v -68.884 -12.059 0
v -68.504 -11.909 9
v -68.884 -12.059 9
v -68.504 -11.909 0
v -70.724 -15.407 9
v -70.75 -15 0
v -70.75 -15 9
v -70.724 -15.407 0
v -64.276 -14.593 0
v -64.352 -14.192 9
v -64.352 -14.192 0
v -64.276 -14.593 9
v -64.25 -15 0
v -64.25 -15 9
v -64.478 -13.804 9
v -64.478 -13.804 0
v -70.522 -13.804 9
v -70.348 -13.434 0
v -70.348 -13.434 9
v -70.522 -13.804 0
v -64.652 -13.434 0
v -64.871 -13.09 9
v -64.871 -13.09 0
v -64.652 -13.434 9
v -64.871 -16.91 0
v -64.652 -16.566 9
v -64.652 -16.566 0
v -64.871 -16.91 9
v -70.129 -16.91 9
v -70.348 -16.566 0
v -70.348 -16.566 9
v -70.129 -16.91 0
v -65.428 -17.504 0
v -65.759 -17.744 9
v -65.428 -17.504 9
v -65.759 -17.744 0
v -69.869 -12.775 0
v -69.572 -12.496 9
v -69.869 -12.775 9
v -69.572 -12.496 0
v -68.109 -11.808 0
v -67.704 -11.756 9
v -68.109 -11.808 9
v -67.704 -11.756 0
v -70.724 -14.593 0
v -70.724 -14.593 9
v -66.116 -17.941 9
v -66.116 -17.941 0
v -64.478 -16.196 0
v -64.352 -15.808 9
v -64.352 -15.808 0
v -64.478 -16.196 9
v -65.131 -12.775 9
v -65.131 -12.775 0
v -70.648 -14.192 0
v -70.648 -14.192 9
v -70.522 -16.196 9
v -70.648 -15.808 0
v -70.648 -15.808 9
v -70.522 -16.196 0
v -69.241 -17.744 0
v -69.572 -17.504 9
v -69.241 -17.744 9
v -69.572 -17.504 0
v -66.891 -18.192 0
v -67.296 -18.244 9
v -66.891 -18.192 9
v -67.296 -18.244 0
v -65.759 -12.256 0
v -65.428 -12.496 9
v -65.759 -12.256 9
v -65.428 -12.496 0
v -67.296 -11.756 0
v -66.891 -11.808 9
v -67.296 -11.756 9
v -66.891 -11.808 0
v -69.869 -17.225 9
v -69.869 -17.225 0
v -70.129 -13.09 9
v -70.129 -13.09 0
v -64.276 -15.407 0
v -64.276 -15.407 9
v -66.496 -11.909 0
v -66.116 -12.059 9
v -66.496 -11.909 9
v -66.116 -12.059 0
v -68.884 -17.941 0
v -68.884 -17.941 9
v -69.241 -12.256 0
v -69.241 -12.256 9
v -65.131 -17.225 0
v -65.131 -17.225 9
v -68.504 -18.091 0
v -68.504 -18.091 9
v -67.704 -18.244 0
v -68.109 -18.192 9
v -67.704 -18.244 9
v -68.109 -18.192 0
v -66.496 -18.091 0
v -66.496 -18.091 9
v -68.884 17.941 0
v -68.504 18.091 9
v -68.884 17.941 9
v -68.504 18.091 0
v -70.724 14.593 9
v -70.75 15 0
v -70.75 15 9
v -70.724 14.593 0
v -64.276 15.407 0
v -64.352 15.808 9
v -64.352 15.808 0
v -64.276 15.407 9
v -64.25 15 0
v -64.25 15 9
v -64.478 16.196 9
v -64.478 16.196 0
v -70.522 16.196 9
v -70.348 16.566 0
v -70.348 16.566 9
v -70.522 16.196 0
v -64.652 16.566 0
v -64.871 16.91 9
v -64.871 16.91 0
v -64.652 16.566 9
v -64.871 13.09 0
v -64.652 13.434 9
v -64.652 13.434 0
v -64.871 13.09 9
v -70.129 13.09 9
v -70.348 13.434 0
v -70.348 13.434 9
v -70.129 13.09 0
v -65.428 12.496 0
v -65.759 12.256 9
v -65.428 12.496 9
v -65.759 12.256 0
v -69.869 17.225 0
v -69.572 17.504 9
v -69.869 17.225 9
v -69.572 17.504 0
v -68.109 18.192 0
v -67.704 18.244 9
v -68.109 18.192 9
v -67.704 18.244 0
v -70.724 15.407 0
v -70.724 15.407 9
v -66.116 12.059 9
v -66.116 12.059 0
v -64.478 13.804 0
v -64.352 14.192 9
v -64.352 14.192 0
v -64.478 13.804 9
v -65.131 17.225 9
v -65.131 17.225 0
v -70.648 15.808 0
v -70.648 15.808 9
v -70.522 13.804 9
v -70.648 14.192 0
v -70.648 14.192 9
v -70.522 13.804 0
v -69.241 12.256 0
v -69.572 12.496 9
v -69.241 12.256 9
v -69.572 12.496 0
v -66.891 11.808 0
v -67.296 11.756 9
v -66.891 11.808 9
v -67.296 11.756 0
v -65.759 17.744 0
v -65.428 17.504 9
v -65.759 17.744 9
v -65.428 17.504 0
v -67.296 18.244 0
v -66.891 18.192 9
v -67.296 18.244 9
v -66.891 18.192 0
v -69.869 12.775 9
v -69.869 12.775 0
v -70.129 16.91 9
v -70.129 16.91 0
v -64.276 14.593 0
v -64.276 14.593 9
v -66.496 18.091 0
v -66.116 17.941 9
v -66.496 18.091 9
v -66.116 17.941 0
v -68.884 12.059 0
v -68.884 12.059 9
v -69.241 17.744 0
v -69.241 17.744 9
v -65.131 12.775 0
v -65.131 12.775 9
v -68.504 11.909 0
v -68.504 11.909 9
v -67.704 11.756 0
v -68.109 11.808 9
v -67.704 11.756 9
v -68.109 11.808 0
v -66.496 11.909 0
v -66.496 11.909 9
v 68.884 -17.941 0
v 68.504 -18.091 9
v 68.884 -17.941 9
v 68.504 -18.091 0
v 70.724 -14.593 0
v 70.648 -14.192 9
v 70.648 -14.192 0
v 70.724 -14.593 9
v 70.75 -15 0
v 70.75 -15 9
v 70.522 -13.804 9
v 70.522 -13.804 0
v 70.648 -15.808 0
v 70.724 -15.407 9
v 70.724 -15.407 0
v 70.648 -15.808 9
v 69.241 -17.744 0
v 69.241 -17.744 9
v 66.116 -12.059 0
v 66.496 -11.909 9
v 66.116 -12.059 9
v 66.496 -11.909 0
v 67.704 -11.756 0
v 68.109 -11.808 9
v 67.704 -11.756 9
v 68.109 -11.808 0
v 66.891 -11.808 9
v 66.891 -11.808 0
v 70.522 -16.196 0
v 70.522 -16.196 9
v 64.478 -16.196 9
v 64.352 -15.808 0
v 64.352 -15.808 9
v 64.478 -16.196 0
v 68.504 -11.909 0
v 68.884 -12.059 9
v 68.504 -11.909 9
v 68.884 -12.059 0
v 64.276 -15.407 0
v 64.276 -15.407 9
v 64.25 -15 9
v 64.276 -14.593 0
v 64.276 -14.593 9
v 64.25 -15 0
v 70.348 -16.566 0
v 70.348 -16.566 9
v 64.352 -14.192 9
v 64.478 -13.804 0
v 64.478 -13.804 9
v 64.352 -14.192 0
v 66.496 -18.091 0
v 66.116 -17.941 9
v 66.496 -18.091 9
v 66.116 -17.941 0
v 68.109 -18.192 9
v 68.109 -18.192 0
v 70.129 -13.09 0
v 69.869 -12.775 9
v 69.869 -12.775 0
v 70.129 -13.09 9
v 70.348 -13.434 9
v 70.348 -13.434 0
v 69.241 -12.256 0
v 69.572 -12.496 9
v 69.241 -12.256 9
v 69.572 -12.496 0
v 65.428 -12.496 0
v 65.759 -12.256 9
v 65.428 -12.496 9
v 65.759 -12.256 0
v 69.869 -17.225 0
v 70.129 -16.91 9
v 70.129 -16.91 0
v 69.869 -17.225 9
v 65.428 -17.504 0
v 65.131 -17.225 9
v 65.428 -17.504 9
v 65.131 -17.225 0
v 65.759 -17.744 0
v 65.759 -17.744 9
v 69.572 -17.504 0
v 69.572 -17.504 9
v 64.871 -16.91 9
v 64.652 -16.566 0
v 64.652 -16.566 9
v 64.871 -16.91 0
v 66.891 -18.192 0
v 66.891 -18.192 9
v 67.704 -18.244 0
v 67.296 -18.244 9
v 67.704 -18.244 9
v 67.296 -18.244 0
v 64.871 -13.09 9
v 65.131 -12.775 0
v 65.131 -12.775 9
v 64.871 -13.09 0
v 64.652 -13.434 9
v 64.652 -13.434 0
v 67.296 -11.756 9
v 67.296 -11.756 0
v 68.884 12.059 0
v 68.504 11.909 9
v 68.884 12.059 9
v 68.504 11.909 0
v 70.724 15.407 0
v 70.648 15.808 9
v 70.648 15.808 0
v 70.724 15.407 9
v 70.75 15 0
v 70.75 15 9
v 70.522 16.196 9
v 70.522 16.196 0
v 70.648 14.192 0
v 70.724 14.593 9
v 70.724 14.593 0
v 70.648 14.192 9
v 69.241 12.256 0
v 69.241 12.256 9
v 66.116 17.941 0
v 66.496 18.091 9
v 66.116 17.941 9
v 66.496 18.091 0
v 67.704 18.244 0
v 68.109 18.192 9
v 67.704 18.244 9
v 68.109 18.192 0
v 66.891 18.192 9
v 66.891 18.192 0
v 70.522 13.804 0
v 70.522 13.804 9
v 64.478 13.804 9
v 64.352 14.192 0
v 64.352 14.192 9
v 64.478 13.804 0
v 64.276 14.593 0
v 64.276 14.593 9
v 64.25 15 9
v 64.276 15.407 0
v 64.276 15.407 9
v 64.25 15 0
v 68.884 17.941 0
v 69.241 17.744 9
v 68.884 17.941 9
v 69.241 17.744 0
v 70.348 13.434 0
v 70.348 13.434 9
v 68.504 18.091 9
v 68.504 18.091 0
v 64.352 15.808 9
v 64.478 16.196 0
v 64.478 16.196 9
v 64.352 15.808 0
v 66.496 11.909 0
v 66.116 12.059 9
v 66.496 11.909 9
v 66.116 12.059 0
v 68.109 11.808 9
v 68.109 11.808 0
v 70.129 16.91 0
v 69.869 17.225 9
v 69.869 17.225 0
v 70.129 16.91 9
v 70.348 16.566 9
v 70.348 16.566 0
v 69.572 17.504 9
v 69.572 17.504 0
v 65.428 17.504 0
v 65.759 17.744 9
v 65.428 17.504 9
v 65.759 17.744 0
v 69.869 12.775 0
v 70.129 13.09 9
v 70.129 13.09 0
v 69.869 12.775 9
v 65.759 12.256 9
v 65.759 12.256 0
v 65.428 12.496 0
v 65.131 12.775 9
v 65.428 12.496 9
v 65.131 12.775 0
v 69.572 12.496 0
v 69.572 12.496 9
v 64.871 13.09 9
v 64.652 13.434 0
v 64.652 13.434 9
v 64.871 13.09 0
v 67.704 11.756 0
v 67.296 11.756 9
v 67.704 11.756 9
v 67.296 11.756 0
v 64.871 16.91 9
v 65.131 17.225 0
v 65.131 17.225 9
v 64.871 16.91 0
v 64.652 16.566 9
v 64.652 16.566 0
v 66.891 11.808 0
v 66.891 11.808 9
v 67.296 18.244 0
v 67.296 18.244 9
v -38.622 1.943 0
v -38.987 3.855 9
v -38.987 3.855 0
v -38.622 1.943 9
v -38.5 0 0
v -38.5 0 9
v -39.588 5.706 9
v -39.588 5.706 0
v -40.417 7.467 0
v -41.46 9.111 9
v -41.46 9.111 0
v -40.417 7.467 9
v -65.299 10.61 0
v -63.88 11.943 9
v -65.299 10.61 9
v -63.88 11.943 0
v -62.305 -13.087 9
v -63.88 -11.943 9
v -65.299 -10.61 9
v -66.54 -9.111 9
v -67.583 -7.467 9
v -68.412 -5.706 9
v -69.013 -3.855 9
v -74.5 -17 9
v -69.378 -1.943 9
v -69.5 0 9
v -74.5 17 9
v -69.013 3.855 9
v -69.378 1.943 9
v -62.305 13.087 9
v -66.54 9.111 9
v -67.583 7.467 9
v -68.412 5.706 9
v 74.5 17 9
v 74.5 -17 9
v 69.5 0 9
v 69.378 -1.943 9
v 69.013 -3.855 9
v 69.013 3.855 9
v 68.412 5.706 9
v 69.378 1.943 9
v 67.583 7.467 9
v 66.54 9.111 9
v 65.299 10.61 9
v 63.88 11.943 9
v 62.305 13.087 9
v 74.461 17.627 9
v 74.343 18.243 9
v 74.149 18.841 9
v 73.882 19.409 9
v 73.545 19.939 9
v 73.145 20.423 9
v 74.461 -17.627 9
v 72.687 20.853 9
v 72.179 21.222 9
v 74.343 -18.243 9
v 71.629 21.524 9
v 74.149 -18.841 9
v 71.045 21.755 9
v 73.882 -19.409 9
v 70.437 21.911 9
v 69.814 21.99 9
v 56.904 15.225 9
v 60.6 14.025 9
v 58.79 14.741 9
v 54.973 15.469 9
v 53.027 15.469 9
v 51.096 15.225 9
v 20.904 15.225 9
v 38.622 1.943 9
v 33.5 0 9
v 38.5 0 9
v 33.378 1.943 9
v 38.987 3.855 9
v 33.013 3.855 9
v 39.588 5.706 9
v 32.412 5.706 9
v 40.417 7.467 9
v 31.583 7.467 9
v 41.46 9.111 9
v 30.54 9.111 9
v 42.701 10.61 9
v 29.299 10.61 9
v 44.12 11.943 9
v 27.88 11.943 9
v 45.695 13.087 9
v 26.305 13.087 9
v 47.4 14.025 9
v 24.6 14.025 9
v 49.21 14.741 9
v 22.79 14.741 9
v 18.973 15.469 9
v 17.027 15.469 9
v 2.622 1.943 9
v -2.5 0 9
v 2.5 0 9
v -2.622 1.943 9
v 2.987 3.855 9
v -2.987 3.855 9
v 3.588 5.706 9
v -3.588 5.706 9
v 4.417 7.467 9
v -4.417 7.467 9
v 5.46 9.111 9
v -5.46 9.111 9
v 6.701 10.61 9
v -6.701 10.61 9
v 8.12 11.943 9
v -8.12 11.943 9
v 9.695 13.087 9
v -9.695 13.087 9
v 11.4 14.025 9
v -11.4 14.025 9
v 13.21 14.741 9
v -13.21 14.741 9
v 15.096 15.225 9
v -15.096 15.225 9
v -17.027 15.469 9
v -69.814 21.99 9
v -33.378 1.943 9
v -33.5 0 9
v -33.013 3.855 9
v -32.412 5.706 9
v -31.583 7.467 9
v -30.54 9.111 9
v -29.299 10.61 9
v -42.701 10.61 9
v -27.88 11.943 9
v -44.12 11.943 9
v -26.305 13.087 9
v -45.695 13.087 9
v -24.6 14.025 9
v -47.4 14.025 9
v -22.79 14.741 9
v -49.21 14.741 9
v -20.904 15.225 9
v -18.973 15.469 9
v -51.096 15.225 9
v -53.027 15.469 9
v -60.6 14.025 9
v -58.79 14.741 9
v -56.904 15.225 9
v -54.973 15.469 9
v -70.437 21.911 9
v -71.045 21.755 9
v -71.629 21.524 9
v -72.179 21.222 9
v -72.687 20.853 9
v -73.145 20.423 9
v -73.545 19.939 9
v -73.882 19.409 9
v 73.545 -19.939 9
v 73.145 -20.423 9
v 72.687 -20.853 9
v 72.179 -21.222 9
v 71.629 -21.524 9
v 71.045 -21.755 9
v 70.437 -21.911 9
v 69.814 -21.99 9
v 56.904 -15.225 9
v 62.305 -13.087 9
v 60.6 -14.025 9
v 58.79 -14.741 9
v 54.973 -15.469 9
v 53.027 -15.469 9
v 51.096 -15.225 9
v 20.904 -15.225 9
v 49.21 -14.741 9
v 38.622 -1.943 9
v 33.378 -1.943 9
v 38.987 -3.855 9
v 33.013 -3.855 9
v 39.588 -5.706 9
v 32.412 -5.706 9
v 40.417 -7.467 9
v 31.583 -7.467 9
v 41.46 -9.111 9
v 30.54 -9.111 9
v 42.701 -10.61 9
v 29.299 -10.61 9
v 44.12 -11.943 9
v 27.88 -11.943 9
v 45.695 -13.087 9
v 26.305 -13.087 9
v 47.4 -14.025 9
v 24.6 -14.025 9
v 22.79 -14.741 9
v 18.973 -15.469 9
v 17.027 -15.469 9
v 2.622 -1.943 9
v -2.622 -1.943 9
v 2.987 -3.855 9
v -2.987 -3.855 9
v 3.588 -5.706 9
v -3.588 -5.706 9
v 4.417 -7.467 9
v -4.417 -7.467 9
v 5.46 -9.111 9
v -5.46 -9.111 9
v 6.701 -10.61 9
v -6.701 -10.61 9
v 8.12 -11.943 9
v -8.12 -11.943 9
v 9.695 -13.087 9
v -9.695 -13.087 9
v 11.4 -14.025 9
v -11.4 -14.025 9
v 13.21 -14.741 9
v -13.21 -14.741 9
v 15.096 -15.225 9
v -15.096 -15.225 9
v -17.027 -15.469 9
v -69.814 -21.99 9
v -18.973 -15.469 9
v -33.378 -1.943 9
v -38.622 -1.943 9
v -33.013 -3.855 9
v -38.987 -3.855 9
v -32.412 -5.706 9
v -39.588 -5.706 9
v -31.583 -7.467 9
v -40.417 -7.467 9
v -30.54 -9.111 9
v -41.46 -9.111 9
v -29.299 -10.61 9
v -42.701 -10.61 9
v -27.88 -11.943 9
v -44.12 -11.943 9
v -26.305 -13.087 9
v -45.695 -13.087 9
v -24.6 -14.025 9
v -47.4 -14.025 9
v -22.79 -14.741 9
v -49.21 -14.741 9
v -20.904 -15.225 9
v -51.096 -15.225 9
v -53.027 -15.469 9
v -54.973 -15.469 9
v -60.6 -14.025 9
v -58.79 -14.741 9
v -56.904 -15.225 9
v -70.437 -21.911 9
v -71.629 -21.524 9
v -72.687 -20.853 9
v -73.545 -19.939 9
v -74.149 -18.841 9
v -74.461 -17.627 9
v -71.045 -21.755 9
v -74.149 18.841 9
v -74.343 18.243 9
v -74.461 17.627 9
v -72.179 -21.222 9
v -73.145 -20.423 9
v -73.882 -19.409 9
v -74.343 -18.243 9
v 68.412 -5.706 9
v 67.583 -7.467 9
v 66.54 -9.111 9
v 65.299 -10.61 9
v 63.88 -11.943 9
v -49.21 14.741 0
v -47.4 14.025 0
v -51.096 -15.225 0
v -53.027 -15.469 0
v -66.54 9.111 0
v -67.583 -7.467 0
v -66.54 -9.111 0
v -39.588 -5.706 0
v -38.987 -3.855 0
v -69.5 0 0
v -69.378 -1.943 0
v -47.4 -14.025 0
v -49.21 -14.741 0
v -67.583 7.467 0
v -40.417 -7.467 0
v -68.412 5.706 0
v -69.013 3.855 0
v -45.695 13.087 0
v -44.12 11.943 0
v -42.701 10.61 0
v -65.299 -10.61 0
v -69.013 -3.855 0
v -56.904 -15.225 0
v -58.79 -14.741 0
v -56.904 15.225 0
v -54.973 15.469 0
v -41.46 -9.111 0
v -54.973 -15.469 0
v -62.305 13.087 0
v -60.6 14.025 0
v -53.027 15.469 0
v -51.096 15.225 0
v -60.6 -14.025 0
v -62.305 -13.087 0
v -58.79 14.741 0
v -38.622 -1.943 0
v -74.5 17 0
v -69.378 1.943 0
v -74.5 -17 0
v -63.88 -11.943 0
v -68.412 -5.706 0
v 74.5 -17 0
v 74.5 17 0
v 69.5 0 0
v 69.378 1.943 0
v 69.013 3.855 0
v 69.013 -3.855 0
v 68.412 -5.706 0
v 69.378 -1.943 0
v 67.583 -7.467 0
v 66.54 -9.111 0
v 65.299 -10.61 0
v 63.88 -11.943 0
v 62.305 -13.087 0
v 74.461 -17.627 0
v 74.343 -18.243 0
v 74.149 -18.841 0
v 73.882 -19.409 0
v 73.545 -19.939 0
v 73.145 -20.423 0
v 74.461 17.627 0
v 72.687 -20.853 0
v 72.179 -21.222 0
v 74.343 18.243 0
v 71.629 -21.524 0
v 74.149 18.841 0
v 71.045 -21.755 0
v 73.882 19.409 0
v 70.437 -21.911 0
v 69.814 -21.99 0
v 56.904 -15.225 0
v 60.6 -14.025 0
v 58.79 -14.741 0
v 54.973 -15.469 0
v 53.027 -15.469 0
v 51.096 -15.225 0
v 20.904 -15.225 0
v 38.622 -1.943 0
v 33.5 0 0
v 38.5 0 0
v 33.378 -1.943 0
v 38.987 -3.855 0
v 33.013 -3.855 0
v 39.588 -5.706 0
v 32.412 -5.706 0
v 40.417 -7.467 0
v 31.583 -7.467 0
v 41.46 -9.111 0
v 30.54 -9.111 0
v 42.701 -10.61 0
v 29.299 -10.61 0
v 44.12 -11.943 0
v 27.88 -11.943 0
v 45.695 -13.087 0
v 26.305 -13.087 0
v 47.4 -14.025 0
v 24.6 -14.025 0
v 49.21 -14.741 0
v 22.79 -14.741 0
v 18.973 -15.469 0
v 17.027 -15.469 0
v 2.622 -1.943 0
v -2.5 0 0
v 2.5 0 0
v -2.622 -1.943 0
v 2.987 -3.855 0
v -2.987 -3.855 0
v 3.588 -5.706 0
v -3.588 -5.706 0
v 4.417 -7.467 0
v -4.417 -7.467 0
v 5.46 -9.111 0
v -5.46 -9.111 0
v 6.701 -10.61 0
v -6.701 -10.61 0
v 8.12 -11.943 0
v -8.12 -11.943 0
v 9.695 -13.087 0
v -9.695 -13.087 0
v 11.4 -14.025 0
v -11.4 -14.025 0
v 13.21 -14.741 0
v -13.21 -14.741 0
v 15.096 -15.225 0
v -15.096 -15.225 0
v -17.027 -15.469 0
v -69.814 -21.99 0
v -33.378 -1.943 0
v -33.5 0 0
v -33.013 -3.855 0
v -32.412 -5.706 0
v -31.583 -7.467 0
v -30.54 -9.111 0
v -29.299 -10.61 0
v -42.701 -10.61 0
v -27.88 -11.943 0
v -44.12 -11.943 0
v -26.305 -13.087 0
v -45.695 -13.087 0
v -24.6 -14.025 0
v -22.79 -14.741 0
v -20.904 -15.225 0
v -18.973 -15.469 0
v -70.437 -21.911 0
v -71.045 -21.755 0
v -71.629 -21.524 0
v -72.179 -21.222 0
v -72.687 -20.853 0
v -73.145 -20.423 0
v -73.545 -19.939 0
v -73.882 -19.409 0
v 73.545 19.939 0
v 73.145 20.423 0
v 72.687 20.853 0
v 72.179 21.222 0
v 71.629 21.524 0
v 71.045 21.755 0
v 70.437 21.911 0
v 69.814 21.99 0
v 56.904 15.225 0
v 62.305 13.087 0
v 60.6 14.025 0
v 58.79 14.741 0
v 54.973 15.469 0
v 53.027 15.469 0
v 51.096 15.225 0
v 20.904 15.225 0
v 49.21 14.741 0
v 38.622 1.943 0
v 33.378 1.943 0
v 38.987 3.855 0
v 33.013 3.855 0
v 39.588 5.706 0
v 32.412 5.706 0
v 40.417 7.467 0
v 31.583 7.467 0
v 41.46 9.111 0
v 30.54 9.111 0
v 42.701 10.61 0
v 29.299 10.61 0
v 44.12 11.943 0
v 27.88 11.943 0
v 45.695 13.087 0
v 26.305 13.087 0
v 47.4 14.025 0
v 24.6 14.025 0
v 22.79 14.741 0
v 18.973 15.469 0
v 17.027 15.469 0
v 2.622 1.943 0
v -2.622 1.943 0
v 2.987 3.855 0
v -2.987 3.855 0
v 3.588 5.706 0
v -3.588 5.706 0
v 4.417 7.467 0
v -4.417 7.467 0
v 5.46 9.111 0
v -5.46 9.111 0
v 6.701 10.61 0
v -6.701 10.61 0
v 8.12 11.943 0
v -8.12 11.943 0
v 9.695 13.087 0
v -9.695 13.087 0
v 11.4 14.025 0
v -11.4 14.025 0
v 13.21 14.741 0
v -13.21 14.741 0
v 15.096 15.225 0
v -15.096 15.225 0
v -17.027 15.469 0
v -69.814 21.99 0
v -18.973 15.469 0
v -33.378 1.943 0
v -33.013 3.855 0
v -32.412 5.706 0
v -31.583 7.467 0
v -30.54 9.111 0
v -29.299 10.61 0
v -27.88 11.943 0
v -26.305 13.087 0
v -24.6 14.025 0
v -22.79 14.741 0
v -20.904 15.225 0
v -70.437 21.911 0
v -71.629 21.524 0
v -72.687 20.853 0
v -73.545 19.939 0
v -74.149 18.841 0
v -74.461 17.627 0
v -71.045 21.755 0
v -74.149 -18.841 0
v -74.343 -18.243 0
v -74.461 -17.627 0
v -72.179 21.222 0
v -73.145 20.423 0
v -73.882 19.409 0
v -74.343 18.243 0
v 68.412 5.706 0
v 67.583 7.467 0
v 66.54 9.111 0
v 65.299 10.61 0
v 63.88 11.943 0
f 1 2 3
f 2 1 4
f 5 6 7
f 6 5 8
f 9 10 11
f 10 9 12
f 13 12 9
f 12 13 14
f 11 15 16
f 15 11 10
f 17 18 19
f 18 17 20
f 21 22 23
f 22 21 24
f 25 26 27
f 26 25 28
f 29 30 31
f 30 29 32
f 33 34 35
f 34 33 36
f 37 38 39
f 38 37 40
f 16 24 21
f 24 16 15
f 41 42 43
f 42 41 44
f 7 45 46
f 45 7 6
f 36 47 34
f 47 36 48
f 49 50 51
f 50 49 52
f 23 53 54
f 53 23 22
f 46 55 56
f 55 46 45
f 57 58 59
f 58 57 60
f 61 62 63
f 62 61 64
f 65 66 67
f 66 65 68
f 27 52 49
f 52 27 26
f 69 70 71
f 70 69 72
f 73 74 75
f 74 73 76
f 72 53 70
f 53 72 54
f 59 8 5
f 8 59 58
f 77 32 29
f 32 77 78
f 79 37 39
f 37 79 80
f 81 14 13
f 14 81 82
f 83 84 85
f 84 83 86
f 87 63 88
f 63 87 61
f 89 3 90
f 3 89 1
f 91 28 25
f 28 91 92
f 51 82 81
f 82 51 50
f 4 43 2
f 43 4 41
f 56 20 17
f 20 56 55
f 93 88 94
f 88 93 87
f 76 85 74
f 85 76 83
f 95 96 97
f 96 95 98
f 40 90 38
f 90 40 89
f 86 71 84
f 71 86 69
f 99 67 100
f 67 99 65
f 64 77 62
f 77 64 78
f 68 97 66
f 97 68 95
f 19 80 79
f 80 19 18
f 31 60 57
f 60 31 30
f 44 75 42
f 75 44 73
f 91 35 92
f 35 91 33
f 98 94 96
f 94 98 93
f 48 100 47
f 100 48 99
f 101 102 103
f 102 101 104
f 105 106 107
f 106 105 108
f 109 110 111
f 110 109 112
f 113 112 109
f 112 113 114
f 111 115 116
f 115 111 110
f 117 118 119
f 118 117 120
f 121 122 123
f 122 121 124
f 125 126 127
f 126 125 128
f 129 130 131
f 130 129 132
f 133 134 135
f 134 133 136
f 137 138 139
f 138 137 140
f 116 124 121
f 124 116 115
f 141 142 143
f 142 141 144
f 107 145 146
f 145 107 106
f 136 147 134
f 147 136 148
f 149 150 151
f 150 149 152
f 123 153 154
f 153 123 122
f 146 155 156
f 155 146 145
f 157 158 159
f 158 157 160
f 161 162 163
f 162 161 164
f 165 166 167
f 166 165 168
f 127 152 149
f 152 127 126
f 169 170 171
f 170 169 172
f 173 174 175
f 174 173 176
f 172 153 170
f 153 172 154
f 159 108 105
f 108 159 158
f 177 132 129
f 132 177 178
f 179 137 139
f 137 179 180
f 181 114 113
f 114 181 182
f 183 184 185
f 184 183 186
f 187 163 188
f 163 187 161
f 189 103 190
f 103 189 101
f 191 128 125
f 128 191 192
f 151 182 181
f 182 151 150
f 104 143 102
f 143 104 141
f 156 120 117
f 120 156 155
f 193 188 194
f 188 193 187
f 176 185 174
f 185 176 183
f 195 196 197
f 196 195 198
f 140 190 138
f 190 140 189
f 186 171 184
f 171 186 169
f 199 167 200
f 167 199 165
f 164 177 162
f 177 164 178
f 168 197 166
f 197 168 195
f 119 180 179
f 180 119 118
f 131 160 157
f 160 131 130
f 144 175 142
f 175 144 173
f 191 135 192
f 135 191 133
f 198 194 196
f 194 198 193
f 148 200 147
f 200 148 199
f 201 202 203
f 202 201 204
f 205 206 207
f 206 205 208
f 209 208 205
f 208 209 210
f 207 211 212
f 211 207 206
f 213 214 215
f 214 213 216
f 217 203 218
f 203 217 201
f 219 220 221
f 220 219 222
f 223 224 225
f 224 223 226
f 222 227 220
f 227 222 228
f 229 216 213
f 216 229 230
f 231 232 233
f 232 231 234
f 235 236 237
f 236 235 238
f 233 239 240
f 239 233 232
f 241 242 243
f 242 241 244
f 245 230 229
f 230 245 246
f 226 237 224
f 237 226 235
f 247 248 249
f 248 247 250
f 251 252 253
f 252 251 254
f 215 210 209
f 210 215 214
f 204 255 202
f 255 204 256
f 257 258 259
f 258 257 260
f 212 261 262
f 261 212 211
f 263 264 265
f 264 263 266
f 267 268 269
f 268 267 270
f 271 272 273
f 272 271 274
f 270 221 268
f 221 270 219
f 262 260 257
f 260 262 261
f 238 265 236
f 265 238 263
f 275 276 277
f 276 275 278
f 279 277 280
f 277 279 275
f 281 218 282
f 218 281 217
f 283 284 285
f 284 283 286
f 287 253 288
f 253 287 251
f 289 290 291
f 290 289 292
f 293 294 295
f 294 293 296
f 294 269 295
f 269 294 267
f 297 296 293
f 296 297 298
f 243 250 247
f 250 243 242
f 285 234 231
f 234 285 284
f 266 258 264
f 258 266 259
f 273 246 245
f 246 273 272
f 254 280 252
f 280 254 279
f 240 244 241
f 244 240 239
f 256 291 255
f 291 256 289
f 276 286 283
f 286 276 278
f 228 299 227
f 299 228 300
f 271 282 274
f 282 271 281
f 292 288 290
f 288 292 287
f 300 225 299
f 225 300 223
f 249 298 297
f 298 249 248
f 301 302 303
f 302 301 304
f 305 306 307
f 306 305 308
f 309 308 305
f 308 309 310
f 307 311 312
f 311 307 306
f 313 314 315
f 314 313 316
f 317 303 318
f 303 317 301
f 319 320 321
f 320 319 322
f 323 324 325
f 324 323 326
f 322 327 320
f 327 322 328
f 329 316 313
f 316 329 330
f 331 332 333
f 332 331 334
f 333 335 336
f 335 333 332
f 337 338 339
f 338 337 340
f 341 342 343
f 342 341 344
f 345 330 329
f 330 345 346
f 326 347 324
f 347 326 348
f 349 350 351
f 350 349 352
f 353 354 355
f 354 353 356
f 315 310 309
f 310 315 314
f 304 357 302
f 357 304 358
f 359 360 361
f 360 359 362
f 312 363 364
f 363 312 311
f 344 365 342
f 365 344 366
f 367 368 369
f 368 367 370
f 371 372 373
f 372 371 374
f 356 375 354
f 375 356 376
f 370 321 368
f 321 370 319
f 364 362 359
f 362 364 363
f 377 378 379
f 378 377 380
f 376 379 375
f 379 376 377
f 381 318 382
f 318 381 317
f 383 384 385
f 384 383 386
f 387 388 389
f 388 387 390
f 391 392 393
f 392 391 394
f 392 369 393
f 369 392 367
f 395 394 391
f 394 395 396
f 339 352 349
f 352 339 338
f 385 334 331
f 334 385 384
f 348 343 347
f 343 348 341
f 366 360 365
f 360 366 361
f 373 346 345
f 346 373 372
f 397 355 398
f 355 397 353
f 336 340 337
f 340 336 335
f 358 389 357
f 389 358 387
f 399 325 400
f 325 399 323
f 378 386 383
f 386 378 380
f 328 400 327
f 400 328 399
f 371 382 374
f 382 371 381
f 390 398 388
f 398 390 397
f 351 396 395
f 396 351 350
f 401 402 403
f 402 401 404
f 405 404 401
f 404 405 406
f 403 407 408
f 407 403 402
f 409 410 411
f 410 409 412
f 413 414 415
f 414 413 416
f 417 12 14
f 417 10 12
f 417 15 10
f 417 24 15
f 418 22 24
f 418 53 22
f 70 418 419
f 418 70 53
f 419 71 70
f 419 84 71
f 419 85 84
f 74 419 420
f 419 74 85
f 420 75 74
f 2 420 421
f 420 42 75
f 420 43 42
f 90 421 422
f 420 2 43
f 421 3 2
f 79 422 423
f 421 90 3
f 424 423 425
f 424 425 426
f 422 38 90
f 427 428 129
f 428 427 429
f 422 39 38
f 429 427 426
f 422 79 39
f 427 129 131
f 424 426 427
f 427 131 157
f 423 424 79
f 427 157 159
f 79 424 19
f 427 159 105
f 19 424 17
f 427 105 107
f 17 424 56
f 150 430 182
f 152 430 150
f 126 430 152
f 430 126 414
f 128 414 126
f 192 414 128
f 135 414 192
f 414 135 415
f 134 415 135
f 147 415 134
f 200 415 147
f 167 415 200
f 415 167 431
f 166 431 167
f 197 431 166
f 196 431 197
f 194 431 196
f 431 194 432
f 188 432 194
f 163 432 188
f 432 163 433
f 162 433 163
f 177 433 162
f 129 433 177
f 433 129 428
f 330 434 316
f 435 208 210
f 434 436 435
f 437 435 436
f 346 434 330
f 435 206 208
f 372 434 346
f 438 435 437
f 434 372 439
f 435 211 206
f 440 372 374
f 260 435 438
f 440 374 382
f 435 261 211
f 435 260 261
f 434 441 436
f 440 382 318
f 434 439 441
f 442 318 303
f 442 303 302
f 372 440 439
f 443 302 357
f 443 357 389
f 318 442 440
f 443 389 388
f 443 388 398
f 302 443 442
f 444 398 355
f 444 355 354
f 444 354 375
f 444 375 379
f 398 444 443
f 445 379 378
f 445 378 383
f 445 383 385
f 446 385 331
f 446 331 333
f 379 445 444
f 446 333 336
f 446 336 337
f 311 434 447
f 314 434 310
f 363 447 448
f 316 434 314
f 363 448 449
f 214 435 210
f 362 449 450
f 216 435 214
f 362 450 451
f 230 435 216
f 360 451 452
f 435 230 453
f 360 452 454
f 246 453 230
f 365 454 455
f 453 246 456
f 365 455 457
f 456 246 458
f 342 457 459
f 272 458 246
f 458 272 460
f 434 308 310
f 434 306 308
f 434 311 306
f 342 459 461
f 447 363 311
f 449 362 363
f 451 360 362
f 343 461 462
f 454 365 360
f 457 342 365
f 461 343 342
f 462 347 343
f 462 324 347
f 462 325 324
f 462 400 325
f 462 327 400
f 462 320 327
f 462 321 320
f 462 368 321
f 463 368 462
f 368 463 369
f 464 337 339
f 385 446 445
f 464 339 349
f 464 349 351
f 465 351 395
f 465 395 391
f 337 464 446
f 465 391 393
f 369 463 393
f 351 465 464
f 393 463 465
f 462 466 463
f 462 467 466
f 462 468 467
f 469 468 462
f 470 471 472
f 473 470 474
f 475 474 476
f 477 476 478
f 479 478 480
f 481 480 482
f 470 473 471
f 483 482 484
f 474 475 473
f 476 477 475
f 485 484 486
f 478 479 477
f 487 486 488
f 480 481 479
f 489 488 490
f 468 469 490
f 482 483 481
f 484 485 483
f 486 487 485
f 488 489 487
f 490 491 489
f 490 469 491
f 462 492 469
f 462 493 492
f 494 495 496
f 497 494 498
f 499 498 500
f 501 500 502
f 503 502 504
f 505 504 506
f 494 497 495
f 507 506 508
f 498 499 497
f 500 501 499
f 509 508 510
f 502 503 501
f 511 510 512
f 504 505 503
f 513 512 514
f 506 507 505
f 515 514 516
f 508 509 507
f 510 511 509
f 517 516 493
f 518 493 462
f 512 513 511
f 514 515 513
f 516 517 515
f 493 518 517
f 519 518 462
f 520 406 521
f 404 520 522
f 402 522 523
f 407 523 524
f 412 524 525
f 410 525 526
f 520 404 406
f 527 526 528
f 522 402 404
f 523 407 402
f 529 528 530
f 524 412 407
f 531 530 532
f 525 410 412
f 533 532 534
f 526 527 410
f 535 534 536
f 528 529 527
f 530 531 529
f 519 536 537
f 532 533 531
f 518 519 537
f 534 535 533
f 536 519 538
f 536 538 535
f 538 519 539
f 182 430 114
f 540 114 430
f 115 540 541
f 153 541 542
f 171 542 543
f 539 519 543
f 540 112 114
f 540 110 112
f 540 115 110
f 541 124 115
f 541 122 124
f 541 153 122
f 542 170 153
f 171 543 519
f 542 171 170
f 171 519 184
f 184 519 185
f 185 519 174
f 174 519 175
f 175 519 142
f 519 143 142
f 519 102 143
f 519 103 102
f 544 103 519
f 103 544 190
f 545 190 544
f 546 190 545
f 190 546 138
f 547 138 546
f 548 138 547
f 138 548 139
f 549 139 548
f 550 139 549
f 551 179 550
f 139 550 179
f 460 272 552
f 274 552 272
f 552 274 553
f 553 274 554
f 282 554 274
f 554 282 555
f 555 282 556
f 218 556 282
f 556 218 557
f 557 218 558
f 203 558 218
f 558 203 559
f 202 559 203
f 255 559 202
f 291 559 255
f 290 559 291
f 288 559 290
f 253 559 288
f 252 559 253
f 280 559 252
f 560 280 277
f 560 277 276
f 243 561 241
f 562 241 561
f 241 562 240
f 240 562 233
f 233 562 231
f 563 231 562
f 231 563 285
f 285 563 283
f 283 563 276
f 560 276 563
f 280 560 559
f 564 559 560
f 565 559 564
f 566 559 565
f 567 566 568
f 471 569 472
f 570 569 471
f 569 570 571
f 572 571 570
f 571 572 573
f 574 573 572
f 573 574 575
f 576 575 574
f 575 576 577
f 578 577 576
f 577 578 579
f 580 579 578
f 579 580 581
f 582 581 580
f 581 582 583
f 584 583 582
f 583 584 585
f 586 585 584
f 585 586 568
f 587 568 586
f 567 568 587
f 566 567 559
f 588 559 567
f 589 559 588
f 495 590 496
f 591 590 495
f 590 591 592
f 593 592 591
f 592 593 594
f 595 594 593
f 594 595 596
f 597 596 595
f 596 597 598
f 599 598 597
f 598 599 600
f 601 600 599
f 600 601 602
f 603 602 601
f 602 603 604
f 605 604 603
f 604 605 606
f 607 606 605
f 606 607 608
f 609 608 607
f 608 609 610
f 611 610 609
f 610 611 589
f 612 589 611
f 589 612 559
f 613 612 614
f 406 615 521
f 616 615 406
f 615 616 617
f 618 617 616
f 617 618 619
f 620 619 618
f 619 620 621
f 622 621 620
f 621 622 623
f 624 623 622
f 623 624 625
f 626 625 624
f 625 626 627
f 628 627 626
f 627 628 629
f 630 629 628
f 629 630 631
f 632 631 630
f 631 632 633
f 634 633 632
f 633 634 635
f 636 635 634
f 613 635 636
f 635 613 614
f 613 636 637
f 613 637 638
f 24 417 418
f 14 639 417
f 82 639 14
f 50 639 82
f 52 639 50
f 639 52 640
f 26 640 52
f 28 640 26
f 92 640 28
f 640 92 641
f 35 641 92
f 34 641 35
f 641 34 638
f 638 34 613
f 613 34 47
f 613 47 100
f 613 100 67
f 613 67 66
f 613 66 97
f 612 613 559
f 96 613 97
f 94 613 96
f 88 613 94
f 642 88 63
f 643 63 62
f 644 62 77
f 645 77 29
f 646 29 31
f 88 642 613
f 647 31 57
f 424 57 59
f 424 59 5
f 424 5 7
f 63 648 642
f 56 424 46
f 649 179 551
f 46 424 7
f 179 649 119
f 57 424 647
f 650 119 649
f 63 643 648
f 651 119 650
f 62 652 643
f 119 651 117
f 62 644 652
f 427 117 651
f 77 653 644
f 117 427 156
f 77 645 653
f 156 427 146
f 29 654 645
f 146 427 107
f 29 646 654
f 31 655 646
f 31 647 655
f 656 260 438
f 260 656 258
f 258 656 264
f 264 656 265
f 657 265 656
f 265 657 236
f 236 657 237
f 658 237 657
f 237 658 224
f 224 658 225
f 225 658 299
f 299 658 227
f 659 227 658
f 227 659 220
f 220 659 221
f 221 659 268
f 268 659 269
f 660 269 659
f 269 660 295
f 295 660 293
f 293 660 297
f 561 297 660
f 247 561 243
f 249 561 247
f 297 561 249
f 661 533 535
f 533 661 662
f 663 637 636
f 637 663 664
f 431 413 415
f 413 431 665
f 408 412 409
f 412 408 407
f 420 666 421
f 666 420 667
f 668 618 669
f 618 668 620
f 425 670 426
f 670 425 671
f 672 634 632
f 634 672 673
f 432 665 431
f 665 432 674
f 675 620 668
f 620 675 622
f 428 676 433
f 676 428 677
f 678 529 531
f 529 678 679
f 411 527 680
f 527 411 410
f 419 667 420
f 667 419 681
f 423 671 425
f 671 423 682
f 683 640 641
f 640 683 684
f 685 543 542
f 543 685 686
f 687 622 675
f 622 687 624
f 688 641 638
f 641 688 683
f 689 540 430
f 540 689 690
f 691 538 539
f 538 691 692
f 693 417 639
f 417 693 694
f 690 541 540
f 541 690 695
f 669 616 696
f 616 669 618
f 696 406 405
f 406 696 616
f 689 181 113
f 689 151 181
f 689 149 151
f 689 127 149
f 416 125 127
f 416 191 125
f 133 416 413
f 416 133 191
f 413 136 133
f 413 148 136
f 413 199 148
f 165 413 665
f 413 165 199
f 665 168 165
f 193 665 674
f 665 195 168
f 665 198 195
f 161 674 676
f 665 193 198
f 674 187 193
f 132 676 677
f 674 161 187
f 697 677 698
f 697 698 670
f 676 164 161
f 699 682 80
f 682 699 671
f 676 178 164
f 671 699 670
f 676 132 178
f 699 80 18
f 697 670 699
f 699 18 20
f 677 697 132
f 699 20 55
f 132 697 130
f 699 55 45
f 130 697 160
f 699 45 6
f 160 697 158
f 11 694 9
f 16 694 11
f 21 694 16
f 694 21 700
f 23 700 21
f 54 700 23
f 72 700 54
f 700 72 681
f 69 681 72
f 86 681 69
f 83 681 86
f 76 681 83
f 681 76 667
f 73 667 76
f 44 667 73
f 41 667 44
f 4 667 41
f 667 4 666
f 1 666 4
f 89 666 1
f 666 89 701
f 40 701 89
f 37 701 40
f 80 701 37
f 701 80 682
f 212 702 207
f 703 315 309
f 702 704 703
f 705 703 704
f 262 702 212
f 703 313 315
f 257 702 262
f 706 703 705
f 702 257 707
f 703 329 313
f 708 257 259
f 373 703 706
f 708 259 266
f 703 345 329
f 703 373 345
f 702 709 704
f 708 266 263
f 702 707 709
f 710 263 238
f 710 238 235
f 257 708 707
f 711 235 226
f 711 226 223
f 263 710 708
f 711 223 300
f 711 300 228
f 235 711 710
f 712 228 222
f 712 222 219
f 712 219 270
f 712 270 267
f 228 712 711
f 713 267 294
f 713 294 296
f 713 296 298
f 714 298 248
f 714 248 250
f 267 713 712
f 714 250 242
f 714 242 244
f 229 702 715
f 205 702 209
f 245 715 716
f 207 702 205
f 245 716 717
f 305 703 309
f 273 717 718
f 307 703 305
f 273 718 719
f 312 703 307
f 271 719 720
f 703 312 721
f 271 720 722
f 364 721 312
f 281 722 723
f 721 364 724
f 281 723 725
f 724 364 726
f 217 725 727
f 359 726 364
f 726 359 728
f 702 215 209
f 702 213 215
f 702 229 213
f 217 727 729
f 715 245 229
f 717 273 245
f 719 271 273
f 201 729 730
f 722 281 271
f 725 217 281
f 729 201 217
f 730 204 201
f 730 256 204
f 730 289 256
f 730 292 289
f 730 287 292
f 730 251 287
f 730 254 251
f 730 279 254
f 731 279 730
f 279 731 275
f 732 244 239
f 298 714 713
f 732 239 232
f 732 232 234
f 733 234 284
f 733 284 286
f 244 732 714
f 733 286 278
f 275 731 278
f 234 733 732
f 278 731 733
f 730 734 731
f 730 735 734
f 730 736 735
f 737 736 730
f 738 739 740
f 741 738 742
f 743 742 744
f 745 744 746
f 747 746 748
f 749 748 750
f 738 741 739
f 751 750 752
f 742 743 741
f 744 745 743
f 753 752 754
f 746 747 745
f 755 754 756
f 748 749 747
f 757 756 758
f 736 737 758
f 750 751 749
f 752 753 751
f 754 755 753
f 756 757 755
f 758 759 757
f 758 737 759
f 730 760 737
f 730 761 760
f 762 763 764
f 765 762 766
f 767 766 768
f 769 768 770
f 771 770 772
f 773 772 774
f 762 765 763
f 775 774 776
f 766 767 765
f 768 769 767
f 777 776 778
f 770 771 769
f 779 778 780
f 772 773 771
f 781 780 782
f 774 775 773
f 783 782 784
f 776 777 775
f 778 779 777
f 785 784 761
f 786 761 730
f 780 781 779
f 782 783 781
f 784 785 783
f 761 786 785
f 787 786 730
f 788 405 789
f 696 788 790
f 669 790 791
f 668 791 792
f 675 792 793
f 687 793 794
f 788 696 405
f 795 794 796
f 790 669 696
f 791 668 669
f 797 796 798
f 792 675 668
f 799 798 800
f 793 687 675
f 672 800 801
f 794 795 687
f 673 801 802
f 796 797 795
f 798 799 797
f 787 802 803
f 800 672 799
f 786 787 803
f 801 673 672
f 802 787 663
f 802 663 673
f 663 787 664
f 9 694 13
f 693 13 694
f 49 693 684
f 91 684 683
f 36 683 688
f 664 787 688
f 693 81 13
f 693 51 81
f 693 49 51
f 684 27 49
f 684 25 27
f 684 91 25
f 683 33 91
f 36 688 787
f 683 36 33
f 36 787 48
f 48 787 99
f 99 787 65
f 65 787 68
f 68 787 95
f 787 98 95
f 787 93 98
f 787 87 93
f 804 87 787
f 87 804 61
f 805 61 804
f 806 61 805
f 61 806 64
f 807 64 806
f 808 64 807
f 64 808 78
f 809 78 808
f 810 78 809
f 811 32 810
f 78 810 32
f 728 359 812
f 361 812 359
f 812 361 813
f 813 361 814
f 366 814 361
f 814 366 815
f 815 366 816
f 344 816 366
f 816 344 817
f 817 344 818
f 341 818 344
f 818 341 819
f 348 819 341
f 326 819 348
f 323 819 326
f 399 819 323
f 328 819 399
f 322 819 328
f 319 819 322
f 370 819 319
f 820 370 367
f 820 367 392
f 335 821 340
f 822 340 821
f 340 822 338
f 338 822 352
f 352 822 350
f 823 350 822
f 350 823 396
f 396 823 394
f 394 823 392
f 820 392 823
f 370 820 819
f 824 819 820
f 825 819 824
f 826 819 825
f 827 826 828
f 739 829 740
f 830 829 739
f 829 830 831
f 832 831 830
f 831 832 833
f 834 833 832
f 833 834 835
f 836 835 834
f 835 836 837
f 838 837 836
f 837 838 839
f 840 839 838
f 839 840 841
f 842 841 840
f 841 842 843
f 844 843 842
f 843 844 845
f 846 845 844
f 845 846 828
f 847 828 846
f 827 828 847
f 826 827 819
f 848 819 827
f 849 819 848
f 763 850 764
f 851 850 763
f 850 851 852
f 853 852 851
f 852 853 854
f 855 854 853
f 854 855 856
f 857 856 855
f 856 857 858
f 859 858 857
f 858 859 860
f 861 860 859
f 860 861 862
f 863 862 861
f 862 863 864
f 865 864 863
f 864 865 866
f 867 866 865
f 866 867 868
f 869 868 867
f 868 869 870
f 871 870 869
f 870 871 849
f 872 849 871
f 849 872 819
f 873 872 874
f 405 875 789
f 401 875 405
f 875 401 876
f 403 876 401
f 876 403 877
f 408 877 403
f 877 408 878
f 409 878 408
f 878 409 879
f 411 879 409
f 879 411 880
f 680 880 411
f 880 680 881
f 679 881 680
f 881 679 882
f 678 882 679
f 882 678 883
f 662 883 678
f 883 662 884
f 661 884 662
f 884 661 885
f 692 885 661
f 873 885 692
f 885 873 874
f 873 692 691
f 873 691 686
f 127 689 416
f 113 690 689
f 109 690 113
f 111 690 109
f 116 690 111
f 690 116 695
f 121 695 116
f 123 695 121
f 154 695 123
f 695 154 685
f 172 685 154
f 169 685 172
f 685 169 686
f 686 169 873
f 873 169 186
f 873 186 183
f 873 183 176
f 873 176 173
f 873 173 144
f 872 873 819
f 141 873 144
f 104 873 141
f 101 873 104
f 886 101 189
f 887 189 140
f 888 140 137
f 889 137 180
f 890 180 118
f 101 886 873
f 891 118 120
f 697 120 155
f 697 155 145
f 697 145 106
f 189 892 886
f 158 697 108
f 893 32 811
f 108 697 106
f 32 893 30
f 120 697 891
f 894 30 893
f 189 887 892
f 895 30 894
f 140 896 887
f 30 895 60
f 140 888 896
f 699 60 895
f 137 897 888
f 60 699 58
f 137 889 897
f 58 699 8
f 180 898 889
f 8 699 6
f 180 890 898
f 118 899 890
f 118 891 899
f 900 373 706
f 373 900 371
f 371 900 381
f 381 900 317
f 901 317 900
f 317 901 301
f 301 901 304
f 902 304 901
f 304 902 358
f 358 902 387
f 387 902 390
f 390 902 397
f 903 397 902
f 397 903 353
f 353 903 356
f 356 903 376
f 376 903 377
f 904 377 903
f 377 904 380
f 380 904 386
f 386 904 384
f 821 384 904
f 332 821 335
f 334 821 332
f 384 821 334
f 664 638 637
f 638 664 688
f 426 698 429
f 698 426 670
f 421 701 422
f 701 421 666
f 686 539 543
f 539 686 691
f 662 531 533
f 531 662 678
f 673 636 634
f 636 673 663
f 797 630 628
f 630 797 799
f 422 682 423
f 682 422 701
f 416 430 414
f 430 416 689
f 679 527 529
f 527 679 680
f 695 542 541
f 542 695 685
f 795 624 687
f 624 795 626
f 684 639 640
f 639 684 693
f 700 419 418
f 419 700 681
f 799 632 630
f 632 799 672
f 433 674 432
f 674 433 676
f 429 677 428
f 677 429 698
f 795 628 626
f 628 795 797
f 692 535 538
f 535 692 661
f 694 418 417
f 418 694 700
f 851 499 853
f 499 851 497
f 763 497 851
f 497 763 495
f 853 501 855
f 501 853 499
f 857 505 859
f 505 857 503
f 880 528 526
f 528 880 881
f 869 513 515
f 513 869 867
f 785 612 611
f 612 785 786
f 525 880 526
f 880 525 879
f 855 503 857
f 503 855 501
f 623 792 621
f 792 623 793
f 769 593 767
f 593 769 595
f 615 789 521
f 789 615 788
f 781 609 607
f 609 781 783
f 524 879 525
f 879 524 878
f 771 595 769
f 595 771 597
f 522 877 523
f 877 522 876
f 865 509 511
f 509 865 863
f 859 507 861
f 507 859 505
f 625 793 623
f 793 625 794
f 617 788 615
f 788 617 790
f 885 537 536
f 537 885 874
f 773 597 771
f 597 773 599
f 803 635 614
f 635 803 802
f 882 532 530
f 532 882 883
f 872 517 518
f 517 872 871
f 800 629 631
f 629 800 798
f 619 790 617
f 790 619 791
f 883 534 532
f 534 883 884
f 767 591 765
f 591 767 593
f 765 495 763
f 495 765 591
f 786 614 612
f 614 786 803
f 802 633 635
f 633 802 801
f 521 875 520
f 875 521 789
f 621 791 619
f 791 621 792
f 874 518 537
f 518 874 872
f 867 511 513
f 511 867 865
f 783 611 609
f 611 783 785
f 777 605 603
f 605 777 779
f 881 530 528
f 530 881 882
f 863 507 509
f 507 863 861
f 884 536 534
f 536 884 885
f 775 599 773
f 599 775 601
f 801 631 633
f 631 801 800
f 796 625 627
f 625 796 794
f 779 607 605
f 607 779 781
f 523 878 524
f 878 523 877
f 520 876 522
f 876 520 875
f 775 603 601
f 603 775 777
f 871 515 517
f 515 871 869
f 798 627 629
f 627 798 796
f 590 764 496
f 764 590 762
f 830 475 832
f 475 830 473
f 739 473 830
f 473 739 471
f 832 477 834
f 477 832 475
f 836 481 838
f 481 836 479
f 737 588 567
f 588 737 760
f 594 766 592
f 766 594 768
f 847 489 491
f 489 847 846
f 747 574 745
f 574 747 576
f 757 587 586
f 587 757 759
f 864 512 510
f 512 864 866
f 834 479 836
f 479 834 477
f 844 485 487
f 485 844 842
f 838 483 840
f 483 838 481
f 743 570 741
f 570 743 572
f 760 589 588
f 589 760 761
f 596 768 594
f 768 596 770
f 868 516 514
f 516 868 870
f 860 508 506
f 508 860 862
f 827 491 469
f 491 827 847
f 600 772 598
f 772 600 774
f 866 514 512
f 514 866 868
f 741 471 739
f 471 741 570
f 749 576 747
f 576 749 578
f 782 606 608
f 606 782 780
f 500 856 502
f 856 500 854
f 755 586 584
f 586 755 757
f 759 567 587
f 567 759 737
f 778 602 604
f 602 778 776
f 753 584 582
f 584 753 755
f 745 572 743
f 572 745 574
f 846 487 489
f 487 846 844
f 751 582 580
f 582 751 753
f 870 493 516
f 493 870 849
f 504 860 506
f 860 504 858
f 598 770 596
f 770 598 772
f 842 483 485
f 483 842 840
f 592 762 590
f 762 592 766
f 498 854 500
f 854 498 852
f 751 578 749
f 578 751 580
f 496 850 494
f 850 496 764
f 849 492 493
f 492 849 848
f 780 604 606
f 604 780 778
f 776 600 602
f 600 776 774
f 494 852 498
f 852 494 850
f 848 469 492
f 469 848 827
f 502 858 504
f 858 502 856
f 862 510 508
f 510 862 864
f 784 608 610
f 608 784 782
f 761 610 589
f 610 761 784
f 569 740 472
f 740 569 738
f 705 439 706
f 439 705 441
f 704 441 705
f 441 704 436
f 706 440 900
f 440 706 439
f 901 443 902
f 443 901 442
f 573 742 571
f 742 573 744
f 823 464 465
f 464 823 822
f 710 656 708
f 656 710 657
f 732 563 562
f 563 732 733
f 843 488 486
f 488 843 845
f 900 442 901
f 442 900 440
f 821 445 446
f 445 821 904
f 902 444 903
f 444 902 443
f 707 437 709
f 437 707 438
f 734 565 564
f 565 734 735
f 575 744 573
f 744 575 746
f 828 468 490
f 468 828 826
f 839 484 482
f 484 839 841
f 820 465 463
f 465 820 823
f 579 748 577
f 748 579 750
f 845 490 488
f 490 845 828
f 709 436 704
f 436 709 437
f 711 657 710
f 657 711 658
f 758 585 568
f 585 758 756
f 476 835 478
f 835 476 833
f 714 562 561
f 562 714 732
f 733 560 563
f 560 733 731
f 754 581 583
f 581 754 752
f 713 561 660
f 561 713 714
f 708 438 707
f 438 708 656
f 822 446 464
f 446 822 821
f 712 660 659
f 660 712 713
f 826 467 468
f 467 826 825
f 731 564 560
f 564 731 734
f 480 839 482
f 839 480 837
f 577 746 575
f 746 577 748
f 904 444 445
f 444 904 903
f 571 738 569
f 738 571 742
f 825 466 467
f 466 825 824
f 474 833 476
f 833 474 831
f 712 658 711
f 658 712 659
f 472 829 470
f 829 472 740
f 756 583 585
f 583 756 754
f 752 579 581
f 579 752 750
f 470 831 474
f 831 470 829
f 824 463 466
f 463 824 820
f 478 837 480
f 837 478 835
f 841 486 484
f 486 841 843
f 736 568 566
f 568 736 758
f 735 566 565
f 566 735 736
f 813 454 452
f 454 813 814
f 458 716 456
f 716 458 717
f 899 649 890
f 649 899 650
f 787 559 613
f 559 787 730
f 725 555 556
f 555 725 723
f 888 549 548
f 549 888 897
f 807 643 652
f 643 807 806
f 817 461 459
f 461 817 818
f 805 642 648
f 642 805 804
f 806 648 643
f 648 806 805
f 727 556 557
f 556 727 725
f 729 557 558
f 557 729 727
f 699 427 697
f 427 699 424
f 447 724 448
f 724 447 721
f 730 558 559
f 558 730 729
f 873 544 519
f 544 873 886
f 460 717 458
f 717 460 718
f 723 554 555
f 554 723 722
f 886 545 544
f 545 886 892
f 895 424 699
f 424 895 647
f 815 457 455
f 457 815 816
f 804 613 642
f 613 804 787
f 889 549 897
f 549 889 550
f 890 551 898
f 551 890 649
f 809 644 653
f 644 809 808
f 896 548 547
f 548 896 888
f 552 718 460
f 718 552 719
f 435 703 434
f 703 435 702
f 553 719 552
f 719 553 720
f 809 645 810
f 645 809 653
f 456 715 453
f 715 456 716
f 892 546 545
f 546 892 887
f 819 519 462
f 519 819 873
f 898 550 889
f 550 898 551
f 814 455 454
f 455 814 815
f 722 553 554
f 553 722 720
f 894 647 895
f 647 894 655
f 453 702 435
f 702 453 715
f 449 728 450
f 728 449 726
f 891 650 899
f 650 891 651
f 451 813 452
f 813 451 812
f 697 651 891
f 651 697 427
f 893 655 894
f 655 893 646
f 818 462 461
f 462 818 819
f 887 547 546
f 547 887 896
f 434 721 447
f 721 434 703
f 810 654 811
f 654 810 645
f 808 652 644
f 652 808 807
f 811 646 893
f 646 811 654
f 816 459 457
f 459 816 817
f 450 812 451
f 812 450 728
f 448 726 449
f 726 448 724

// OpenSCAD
$fn = 50;

difference() {
	union() {
		hull() {
			translate(v = [-69.5, 17.0, 0]) {
				cylinder(h = 9, r = 5);
			}
			translate(v = [69.5, 17.0, 0]) {
				cylinder(h = 9, r = 5);
			}
			translate(v = [-69.5, -17.0, 0]) {
				cylinder(h = 9, r = 5);
			}
			translate(v = [69.5, -17.0, 0]) {
				cylinder(h = 9, r = 5);
			}
		}
	}
	union() {
		translate(v = [-67.5, -15.0, -100.0]) {
			cylinder(h = 200, r = 3.25);
		}
		translate(v = [-67.5, 15.0, -100.0]) {
			cylinder(h = 200, r = 3.25);
		}
		translate(v = [67.5, -15.0, -100.0]) {
			cylinder(h = 200, r = 3.25);
		}
		translate(v = [67.5, 15.0, -100.0]) {
			cylinder(h = 200, r = 3.25);
		}
		translate(v = [-67.5, -15.0, -100.0]) {
			cylinder(h = 200, r = 1.8);
		}
		translate(v = [-67.5, 15.0, -100.0]) {
			cylinder(h = 200, r = 1.8);
		}
		translate(v = [67.5, -15.0, -100.0]) {
			cylinder(h = 200, r = 1.8);
		}
		translate(v = [67.5, 15.0, -100.0]) {
			cylinder(h = 200, r = 1.8);
		}
		translate(v = [-54.0, 0, 0.0]) {
			cylinder(h = 9, r = 15.5);
		}
		translate(v = [-18.0, 0, 0.0]) {
			cylinder(h = 9, r = 15.5);
		}
		translate(v = [18.0, 0, 0.0]) {
			cylinder(h = 9, r = 15.5);
		}
		translate(v = [54.0, 0, 0.0]) {
			cylinder(h = 9, r = 15.5);
		}
	}
}
